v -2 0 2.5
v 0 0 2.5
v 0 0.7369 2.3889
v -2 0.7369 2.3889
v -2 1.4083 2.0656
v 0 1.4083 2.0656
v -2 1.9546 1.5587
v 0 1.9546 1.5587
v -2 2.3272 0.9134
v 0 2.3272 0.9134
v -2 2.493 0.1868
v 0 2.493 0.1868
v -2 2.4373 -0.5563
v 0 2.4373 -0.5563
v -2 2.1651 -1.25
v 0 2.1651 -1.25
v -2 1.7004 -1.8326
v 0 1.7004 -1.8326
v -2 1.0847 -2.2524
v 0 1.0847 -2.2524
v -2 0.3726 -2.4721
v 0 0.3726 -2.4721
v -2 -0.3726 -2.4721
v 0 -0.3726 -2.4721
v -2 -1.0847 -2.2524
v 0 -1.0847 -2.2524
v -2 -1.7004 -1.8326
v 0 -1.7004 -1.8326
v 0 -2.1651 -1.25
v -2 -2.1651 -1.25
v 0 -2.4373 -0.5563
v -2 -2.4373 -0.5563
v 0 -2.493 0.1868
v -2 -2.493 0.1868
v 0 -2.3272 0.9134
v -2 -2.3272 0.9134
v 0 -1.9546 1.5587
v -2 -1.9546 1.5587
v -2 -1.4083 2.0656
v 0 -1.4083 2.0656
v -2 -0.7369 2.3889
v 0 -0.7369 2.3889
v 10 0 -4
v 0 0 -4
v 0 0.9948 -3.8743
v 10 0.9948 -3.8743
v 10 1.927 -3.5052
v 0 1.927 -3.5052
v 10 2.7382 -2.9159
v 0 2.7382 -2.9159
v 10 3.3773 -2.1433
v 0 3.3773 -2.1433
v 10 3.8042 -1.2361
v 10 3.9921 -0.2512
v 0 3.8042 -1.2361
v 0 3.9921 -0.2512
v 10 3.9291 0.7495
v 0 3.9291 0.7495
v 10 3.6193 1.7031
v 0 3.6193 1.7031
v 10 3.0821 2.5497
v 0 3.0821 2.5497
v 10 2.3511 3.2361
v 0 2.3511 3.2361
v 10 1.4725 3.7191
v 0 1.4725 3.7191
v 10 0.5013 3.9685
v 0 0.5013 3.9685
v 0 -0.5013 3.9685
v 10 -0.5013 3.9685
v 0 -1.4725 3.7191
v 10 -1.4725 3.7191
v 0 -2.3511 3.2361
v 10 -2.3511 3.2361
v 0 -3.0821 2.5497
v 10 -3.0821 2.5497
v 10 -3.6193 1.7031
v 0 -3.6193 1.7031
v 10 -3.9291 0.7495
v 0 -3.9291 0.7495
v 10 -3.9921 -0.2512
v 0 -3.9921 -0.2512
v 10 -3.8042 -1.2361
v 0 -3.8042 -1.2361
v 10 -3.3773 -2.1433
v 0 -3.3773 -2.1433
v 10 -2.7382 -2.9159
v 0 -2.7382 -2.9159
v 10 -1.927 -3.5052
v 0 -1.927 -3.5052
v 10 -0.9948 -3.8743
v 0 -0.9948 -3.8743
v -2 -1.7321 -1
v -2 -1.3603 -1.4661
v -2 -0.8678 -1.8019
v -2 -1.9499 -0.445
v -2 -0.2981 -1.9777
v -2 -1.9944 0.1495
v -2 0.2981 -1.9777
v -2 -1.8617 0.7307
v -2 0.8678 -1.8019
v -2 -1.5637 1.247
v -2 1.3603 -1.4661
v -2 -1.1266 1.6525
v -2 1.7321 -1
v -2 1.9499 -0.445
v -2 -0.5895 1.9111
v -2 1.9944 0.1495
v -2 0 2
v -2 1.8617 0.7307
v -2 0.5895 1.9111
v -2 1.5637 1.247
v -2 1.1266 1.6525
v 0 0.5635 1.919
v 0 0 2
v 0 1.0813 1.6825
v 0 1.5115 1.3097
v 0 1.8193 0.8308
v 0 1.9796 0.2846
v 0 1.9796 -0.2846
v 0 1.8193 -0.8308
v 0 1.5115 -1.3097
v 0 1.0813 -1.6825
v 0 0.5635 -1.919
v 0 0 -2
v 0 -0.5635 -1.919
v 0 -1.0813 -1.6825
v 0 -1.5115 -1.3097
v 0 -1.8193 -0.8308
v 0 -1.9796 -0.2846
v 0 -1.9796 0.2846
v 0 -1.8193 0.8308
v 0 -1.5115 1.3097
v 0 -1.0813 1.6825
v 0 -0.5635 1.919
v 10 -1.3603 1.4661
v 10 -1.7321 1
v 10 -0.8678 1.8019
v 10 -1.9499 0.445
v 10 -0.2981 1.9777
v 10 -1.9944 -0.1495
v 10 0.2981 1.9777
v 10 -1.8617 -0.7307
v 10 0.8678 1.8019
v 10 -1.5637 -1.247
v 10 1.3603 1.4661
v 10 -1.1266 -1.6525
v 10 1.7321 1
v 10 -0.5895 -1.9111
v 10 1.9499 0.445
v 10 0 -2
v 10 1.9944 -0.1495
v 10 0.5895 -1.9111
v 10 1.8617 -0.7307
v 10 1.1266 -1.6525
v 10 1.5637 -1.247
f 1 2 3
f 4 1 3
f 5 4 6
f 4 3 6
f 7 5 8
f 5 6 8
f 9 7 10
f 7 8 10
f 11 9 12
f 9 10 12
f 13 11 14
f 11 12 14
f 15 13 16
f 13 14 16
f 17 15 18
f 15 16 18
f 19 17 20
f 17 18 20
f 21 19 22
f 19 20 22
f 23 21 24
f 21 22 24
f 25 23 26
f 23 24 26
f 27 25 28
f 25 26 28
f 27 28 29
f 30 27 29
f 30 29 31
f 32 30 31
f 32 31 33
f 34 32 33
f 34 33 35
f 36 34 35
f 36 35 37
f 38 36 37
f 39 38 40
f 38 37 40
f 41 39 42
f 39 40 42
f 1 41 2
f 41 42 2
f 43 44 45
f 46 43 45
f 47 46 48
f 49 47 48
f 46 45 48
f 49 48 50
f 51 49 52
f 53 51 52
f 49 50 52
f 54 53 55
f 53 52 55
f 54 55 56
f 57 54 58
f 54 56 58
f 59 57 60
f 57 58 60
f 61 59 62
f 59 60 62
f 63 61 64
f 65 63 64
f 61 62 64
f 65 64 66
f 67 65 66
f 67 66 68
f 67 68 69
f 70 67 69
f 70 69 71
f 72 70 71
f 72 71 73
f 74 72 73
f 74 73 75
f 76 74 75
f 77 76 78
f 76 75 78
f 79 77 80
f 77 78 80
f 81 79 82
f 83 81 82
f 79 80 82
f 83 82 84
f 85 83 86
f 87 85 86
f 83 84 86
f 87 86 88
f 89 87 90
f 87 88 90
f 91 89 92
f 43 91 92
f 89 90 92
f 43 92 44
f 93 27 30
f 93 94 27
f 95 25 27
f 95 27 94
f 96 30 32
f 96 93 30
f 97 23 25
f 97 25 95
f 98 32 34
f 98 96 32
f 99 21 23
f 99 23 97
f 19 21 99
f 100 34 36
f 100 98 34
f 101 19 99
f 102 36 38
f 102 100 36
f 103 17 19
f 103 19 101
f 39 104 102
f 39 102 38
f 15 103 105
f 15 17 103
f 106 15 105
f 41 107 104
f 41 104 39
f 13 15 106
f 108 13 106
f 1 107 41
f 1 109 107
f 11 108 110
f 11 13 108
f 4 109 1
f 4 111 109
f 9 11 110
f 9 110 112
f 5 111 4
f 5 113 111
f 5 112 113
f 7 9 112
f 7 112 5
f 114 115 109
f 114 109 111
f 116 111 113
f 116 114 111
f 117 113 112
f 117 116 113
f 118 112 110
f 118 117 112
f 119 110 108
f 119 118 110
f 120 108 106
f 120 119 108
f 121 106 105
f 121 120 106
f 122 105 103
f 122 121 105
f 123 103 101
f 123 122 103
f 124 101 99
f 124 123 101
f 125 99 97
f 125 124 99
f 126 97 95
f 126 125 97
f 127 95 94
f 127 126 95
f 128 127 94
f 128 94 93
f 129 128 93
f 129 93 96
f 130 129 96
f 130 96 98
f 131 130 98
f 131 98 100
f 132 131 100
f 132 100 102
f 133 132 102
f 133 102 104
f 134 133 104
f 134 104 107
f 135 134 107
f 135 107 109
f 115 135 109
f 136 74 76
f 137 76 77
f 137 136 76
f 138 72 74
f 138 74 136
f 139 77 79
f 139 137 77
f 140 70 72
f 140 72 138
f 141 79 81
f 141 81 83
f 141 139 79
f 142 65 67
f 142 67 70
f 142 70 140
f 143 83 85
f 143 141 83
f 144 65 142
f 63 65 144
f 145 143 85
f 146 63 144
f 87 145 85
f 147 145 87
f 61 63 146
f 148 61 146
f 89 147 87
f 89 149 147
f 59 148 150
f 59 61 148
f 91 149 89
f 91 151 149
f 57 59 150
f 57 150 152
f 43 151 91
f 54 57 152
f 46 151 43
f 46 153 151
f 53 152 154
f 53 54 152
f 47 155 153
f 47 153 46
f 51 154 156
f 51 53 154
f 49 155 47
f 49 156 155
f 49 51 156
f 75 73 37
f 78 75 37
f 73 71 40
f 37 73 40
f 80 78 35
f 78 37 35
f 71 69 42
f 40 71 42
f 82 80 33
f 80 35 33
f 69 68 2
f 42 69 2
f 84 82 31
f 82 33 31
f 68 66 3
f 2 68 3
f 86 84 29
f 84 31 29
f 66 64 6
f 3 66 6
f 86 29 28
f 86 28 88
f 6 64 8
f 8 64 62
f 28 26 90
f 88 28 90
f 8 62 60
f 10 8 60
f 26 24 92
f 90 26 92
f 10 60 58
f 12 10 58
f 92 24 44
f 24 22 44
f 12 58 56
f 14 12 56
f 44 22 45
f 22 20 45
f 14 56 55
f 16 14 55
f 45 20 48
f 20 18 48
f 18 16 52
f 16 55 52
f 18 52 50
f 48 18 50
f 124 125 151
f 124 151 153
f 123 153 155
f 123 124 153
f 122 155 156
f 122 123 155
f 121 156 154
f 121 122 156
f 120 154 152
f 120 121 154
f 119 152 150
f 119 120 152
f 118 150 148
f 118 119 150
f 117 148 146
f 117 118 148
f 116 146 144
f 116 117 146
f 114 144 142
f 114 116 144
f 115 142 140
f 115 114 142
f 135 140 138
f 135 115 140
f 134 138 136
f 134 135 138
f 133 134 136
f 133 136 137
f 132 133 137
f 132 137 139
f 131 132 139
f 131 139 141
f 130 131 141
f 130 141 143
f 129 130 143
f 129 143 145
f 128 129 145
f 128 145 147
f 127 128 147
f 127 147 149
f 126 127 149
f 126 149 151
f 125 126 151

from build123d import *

# Parameters (mm, degrees)
SKETCH1_R           = 4
SKETCH1_R_2         = 2
BOSS_EXTRUDE1_DEPTH = 10
SKETCH2_R           = 2.5
SKETCH2_R_2         = 2
BOSS_EXTRUDE2_DEPTH = 2


with BuildPart() as part:
    # Sketch1 → Boss-Extrude1 (new body)
    with BuildSketch(Plane(origin=(0, 0, 0), x_dir=(0, 0, -1), z_dir=(1, 0, 0))):
        Circle(SKETCH1_R)
        Circle(SKETCH1_R_2, mode=Mode.SUBTRACT)
    extrude(amount=BOSS_EXTRUDE1_DEPTH)

    # Sketch2 → Boss-Extrude2 (add)
    with BuildSketch(Plane.ZY):
        Circle(SKETCH2_R)
        Circle(SKETCH2_R_2, mode=Mode.SUBTRACT)
    extrude(amount=BOSS_EXTRUDE2_DEPTH)


solid = part.part
